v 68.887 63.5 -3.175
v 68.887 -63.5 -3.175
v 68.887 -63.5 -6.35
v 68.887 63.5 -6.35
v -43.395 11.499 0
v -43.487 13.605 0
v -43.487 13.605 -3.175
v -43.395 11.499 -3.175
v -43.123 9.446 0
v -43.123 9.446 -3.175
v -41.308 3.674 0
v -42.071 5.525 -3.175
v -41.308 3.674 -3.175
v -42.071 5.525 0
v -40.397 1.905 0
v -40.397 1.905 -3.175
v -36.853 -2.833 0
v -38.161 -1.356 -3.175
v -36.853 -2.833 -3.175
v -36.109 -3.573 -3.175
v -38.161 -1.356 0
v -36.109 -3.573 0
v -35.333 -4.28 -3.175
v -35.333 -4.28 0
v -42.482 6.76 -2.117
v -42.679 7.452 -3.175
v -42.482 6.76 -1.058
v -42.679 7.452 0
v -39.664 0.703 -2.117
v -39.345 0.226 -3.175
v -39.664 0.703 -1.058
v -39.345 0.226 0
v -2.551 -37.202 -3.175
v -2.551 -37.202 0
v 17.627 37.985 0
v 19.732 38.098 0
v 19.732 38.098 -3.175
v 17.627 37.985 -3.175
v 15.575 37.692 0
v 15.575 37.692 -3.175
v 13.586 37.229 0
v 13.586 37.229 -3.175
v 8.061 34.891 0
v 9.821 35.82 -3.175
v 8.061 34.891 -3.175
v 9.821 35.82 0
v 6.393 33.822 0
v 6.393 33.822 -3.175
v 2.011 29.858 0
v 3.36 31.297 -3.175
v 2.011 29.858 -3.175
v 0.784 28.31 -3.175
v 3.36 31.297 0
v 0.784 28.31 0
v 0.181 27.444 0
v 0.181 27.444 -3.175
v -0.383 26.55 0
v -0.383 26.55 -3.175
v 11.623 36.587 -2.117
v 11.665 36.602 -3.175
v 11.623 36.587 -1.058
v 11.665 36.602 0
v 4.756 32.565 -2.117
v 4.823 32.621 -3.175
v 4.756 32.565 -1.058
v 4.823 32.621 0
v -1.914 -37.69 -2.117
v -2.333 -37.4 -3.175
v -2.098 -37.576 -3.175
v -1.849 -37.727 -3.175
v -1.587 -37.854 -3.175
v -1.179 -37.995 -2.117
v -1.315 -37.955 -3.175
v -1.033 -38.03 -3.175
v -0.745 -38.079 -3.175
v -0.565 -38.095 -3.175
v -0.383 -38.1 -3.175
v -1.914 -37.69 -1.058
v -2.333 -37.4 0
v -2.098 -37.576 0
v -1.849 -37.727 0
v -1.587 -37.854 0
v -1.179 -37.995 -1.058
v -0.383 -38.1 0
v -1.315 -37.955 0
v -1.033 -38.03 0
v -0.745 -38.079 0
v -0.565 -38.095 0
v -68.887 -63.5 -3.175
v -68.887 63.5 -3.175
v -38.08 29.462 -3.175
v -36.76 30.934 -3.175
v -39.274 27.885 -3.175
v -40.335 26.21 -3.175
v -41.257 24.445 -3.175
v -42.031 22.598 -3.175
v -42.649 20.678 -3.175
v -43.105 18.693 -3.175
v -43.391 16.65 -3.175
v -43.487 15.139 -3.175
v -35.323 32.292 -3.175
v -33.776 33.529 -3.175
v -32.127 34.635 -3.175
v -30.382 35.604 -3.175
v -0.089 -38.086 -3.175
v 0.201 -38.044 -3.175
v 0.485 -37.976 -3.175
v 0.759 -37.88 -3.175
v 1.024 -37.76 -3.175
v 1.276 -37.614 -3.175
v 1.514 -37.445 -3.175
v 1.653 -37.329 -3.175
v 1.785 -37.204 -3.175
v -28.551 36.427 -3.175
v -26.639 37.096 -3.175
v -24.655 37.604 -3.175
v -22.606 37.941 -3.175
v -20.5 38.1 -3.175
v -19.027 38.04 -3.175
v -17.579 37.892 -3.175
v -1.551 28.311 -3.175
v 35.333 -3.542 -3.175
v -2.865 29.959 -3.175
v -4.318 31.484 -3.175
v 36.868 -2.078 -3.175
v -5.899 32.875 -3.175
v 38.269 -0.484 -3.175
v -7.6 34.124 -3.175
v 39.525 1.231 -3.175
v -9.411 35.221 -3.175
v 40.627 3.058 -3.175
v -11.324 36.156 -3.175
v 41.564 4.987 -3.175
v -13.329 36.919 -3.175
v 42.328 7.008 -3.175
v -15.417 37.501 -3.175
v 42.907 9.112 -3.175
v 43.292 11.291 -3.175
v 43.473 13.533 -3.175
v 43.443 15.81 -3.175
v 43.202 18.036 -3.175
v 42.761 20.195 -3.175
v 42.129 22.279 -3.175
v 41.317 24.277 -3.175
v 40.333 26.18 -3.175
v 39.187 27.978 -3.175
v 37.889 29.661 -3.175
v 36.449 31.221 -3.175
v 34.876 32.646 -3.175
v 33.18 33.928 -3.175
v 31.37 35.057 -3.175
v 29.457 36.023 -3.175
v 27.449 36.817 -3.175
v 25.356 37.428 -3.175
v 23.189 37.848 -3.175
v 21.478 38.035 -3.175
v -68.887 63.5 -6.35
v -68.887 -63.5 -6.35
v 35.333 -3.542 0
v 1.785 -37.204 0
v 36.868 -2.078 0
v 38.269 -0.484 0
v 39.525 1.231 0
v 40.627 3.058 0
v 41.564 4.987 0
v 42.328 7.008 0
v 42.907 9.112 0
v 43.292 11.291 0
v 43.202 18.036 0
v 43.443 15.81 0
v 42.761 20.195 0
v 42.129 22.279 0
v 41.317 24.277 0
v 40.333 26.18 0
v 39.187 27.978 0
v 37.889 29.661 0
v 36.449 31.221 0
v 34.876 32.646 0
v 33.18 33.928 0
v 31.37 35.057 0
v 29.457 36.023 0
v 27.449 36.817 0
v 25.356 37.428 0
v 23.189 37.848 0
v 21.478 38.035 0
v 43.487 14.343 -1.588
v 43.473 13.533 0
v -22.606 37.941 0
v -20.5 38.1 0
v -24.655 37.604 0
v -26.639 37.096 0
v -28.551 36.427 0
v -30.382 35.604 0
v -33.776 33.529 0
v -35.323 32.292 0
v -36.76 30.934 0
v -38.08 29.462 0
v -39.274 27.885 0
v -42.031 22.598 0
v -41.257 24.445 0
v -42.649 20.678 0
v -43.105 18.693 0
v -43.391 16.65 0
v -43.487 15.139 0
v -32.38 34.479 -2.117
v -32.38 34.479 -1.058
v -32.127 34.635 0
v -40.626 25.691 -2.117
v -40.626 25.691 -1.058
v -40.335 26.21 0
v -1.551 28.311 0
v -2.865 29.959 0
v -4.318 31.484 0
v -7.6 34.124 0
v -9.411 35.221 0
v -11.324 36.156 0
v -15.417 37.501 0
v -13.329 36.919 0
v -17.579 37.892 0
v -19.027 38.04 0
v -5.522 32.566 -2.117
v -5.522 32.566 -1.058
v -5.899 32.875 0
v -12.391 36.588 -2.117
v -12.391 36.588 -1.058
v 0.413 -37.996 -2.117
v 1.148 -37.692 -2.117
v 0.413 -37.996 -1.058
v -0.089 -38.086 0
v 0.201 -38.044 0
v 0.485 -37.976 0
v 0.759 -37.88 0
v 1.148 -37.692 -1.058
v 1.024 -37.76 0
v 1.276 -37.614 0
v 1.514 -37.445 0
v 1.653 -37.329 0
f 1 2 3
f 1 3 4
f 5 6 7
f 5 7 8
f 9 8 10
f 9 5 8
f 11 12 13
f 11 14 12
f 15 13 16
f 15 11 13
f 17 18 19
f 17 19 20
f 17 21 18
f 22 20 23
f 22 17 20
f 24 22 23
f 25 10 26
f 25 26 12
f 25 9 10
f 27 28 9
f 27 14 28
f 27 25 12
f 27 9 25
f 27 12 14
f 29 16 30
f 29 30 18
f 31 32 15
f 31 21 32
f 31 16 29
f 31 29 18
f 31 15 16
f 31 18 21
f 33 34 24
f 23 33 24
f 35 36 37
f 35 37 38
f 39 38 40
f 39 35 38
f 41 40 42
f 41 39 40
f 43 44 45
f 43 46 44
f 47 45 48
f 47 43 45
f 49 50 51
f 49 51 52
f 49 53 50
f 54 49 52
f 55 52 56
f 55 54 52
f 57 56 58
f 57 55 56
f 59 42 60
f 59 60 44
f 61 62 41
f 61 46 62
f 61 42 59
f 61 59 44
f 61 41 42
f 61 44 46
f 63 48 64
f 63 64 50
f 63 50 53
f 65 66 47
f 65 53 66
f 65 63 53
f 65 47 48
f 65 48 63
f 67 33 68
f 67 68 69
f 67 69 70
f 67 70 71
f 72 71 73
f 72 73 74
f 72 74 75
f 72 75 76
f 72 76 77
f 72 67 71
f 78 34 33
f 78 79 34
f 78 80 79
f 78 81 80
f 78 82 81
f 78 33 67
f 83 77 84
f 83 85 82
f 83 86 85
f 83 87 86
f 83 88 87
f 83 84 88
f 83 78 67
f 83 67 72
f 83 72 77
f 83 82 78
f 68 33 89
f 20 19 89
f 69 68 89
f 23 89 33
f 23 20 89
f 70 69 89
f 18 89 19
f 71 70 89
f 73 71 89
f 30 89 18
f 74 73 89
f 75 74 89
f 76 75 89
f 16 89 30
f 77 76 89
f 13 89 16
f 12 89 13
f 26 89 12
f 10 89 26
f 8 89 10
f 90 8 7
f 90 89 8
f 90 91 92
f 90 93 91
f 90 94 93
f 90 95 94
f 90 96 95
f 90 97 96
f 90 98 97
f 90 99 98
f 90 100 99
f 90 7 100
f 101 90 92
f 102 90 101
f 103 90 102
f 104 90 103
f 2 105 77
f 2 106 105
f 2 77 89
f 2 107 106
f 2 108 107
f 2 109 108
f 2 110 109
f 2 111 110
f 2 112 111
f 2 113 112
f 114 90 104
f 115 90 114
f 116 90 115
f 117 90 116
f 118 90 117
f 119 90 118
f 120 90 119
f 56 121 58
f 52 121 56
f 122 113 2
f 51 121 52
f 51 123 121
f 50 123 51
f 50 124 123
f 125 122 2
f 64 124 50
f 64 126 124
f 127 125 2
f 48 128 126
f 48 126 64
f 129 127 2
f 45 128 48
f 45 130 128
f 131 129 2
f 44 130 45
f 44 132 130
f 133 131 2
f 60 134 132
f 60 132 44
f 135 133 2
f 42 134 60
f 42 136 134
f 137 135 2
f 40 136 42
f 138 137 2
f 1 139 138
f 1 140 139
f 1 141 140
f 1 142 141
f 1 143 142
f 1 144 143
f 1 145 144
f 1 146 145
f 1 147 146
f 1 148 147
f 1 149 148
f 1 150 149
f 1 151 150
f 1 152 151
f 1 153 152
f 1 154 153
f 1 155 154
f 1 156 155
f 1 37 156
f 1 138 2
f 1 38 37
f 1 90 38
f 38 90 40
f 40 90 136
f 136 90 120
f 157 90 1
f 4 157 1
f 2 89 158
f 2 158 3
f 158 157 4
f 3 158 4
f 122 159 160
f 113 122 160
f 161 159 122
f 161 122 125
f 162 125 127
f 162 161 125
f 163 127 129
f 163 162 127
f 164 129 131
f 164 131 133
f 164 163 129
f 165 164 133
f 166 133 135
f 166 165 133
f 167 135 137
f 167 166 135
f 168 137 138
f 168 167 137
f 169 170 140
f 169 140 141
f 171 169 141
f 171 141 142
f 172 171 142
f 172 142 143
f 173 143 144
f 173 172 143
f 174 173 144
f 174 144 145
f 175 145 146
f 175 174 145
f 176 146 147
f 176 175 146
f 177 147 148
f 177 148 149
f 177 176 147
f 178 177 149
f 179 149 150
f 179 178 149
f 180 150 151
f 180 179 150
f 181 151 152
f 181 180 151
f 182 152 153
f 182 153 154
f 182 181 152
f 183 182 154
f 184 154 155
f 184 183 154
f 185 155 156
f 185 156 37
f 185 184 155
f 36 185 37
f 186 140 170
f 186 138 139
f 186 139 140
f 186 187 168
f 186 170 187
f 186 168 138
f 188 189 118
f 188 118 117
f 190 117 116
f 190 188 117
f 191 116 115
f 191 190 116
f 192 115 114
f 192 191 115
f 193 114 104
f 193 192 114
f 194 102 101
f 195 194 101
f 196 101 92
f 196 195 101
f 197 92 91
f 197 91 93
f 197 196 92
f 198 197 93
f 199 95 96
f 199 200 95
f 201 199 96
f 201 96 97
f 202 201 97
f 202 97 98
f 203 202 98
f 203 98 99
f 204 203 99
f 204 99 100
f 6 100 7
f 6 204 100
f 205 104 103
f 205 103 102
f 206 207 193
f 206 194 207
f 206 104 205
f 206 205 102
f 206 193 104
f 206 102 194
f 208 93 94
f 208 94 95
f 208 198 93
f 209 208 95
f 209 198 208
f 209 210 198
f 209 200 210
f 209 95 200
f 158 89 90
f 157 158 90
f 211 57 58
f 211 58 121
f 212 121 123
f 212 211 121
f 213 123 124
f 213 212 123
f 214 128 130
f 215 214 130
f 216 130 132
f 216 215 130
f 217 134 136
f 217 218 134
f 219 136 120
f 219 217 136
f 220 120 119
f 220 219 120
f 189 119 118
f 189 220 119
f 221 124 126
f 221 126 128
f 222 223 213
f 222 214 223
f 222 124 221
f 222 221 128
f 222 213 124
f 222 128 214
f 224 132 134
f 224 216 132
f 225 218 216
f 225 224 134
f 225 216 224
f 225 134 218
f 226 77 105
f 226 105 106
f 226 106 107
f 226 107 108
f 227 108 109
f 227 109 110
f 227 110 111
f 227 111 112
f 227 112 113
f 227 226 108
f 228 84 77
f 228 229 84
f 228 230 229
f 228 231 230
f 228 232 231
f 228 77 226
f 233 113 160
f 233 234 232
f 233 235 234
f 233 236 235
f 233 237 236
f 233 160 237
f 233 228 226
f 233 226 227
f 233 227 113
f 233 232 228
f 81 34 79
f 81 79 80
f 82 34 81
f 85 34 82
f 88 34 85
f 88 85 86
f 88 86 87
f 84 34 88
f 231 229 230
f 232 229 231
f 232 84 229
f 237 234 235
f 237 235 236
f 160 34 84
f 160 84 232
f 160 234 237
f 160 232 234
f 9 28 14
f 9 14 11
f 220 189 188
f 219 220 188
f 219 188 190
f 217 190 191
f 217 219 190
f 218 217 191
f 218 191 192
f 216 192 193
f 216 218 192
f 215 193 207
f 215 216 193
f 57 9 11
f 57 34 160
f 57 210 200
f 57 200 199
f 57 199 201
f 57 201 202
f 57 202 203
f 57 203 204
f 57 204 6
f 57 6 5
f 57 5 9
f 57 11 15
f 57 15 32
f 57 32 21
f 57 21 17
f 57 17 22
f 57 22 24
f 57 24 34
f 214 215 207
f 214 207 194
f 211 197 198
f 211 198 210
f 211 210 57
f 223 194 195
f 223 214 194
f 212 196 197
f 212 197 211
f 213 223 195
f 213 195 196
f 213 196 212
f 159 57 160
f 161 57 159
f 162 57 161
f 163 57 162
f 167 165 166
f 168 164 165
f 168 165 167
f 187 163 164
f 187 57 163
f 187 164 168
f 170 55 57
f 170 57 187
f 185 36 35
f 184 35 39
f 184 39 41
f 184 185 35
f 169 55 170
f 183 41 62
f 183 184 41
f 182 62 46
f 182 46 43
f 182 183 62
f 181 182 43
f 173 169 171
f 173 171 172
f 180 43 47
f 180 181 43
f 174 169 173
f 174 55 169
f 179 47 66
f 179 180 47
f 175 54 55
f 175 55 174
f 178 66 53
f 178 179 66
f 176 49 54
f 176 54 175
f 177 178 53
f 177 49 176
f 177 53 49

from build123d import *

# Parameters (mm, degrees)
F0_W      = 137.7741502185
F0_H      = 127
F1_DEPTH  = 6.35
F1_FACE_W = 137.7741502185
F1_FACE_H = 127
F2_DEPTH  = 3.175


# Not quite as in the source:
# - a length typed as a fraction of an inch, garbled in the dataset ("3 / 203.2 mm" for 3/8 in), is restored


with BuildPart() as f1:
    # F0 (on Top) → F1 (new body)
    with BuildSketch(Plane.XY):
        Rectangle(F0_W, F0_H)
        with BuildLine():
            add(Edge.make_bspline(
                [(43.4870751092, 14.3433300558), (43.4870751092, 27.462876741), (32.8514196183, 38.0979859262), (19.7318729331, 38.0979859262)],
                knots=[0, 0, 0, 0, 1, 1, 1, 1], degree=3))
            add(Edge.make_bspline(
                [(35.3328363694, -3.5415767003), (40.3215229837, 0.8101175052), (43.4870751092, 7.2004637855), (43.4870751092, 14.3433300558)],
                knots=[0, 0, 0, 0, 1, 1, 1, 1], degree=3))
            Line((35.3328363694, -3.5415767003), (1.7854201908, -37.2041767762))
            add(Edge.make_bspline(
                [(-0.3831377338, -38.1), (0.4300700378, -38.1007554216), (1.2100121742, -37.7785167454), (1.7854201908, -37.2041767762)],
                knots=[0, 0, 0, 0, 1, 1, 1, 1], degree=3))
            add(Edge.make_bspline(
                [(-2.5508625567, -37.2021627024), (-1.9759883158, -37.7770369433), (-1.1963458563, -38.1), (-0.3831377338, -38.1)],
                knots=[0, 0, 0, 0, 1, 1, 1, 1], degree=3))
            Line((-2.5508625567, -37.2021627024), (-35.3333666072, -4.280217526))
            add(Edge.make_bspline(
                [(-43.4870751092, 13.6046892301), (-43.4870751092, 6.4618229599), (-40.3218925434, 0.0714766795), (-35.3333666072, -4.280217526)],
                knots=[0, 0, 0, 0, 1, 1, 1, 1], degree=3))
            add(Edge.make_bspline(
                [(-20.4995127814, 38.1), (-33.6124722867, 37.6843099249), (-43.9027651844, 26.7176487354), (-43.4870751092, 13.6046892301)],
                knots=[0, 0, 0, 0, 1, 1, 1, 1], degree=3))
            add(Edge.make_bspline(
                [(-0.3831377338, 26.5499493108), (-4.4942474015, 33.3906018689), (-11.9332866772, 38.0146472183), (-20.4995127814, 38.1)],
                knots=[0, 0, 0, 0, 1, 1, 1, 1], degree=3))
            add(Edge.make_bspline(
                [(19.7318729331, 38.0979859262), (11.16547776, 38.0134786667), (3.7291785921, 33.3902005219), (-0.3831377338, 26.5499493108)],
                knots=[0, 0, 0, 0, 1, 1, 1, 1], degree=3))
        make_face(mode=Mode.SUBTRACT)
        with BuildLine():
            add(Edge.make_bspline(
                [(35.3328363694, -3.5415767003), (40.3215229837, 0.8101175052), (43.4870751092, 7.2004637855), (43.4870751092, 14.3433300558)],
                knots=[0, 0, 0, 0, 1, 1, 1, 1], degree=3))
            add(Edge.make_bspline(
                [(43.4870751092, 14.3433300558), (43.4870751092, 27.462876741), (32.8514196183, 38.0979859262), (19.7318729331, 38.0979859262)],
                knots=[0, 0, 0, 0, 1, 1, 1, 1], degree=3))
            add(Edge.make_bspline(
                [(19.7318729331, 38.0979859262), (11.16547776, 38.0134786667), (3.7291785921, 33.3902005219), (-0.3831377338, 26.5499493108)],
                knots=[0, 0, 0, 0, 1, 1, 1, 1], degree=3))
            add(Edge.make_bspline(
                [(-0.3831377338, 26.5499493108), (-4.4942474015, 33.3906018689), (-11.9332866772, 38.0146472183), (-20.4995127814, 38.1)],
                knots=[0, 0, 0, 0, 1, 1, 1, 1], degree=3))
            add(Edge.make_bspline(
                [(-20.4995127814, 38.1), (-33.6124722867, 37.6843099249), (-43.9027651844, 26.7176487354), (-43.4870751092, 13.6046892301)],
                knots=[0, 0, 0, 0, 1, 1, 1, 1], degree=3))
            add(Edge.make_bspline(
                [(-43.4870751092, 13.6046892301), (-43.4870751092, 6.4618229599), (-40.3218925434, 0.0714766795), (-35.3333666072, -4.280217526)],
                knots=[0, 0, 0, 0, 1, 1, 1, 1], degree=3))
            Line((-35.3333666072, -4.280217526), (-2.5508625567, -37.2021627024))
            add(Edge.make_bspline(
                [(-2.5508625567, -37.2021627024), (-1.9759883158, -37.7770369433), (-1.1963458563, -38.1), (-0.3831377338, -38.1)],
                knots=[0, 0, 0, 0, 1, 1, 1, 1], degree=3))
            add(Edge.make_bspline(
                [(-0.3831377338, -38.1), (0.4300700378, -38.1007554216), (1.2100121742, -37.7785167454), (1.7854201908, -37.2041767762)],
                knots=[0, 0, 0, 0, 1, 1, 1, 1], degree=3))
            Line((1.7854201908, -37.2041767762), (35.3328363694, -3.5415767003))
        make_face()
    extrude(amount=-F1_DEPTH)

    # F0 (on Top) + F1_face (on face) → F2 (cut)
    with BuildSketch(Plane.XY):
        Rectangle(F0_W, F0_H)
        with BuildLine():
            add(Edge.make_bspline(
                [(43.4870751092, 14.3433300558), (43.4870751092, 27.462876741), (32.8514196183, 38.0979859262), (19.7318729331, 38.0979859262)],
                knots=[0, 0, 0, 0, 1, 1, 1, 1], degree=3))
            add(Edge.make_bspline(
                [(35.3328363694, -3.5415767003), (40.3215229837, 0.8101175052), (43.4870751092, 7.2004637855), (43.4870751092, 14.3433300558)],
                knots=[0, 0, 0, 0, 1, 1, 1, 1], degree=3))
            Line((35.3328363694, -3.5415767003), (1.7854201908, -37.2041767762))
            add(Edge.make_bspline(
                [(-0.3831377338, -38.1), (0.4300700378, -38.1007554216), (1.2100121742, -37.7785167454), (1.7854201908, -37.2041767762)],
                knots=[0, 0, 0, 0, 1, 1, 1, 1], degree=3))
            add(Edge.make_bspline(
                [(-2.5508625567, -37.2021627024), (-1.9759883158, -37.7770369433), (-1.1963458563, -38.1), (-0.3831377338, -38.1)],
                knots=[0, 0, 0, 0, 1, 1, 1, 1], degree=3))
            Line((-2.5508625567, -37.2021627024), (-35.3333666072, -4.280217526))
            add(Edge.make_bspline(
                [(-43.4870751092, 13.6046892301), (-43.4870751092, 6.4618229599), (-40.3218925434, 0.0714766795), (-35.3333666072, -4.280217526)],
                knots=[0, 0, 0, 0, 1, 1, 1, 1], degree=3))
            add(Edge.make_bspline(
                [(-20.4995127814, 38.1), (-33.6124722867, 37.6843099249), (-43.9027651844, 26.7176487354), (-43.4870751092, 13.6046892301)],
                knots=[0, 0, 0, 0, 1, 1, 1, 1], degree=3))
            add(Edge.make_bspline(
                [(-0.3831377338, 26.5499493108), (-4.4942474015, 33.3906018689), (-11.9332866772, 38.0146472183), (-20.4995127814, 38.1)],
                knots=[0, 0, 0, 0, 1, 1, 1, 1], degree=3))
            add(Edge.make_bspline(
                [(19.7318729331, 38.0979859262), (11.16547776, 38.0134786667), (3.7291785921, 33.3902005219), (-0.3831377338, 26.5499493108)],
                knots=[0, 0, 0, 0, 1, 1, 1, 1], degree=3))
        make_face(mode=Mode.SUBTRACT)
    with BuildSketch(Plane(origin=(0, 0, -6.35), x_dir=(1, 0, 0), z_dir=(0, 0, -1))):
        Rectangle(F1_FACE_W, F1_FACE_H)
    extrude(amount=-F2_DEPTH, dir=(0, 0, 1), mode=Mode.SUBTRACT)


solid = f1.part
